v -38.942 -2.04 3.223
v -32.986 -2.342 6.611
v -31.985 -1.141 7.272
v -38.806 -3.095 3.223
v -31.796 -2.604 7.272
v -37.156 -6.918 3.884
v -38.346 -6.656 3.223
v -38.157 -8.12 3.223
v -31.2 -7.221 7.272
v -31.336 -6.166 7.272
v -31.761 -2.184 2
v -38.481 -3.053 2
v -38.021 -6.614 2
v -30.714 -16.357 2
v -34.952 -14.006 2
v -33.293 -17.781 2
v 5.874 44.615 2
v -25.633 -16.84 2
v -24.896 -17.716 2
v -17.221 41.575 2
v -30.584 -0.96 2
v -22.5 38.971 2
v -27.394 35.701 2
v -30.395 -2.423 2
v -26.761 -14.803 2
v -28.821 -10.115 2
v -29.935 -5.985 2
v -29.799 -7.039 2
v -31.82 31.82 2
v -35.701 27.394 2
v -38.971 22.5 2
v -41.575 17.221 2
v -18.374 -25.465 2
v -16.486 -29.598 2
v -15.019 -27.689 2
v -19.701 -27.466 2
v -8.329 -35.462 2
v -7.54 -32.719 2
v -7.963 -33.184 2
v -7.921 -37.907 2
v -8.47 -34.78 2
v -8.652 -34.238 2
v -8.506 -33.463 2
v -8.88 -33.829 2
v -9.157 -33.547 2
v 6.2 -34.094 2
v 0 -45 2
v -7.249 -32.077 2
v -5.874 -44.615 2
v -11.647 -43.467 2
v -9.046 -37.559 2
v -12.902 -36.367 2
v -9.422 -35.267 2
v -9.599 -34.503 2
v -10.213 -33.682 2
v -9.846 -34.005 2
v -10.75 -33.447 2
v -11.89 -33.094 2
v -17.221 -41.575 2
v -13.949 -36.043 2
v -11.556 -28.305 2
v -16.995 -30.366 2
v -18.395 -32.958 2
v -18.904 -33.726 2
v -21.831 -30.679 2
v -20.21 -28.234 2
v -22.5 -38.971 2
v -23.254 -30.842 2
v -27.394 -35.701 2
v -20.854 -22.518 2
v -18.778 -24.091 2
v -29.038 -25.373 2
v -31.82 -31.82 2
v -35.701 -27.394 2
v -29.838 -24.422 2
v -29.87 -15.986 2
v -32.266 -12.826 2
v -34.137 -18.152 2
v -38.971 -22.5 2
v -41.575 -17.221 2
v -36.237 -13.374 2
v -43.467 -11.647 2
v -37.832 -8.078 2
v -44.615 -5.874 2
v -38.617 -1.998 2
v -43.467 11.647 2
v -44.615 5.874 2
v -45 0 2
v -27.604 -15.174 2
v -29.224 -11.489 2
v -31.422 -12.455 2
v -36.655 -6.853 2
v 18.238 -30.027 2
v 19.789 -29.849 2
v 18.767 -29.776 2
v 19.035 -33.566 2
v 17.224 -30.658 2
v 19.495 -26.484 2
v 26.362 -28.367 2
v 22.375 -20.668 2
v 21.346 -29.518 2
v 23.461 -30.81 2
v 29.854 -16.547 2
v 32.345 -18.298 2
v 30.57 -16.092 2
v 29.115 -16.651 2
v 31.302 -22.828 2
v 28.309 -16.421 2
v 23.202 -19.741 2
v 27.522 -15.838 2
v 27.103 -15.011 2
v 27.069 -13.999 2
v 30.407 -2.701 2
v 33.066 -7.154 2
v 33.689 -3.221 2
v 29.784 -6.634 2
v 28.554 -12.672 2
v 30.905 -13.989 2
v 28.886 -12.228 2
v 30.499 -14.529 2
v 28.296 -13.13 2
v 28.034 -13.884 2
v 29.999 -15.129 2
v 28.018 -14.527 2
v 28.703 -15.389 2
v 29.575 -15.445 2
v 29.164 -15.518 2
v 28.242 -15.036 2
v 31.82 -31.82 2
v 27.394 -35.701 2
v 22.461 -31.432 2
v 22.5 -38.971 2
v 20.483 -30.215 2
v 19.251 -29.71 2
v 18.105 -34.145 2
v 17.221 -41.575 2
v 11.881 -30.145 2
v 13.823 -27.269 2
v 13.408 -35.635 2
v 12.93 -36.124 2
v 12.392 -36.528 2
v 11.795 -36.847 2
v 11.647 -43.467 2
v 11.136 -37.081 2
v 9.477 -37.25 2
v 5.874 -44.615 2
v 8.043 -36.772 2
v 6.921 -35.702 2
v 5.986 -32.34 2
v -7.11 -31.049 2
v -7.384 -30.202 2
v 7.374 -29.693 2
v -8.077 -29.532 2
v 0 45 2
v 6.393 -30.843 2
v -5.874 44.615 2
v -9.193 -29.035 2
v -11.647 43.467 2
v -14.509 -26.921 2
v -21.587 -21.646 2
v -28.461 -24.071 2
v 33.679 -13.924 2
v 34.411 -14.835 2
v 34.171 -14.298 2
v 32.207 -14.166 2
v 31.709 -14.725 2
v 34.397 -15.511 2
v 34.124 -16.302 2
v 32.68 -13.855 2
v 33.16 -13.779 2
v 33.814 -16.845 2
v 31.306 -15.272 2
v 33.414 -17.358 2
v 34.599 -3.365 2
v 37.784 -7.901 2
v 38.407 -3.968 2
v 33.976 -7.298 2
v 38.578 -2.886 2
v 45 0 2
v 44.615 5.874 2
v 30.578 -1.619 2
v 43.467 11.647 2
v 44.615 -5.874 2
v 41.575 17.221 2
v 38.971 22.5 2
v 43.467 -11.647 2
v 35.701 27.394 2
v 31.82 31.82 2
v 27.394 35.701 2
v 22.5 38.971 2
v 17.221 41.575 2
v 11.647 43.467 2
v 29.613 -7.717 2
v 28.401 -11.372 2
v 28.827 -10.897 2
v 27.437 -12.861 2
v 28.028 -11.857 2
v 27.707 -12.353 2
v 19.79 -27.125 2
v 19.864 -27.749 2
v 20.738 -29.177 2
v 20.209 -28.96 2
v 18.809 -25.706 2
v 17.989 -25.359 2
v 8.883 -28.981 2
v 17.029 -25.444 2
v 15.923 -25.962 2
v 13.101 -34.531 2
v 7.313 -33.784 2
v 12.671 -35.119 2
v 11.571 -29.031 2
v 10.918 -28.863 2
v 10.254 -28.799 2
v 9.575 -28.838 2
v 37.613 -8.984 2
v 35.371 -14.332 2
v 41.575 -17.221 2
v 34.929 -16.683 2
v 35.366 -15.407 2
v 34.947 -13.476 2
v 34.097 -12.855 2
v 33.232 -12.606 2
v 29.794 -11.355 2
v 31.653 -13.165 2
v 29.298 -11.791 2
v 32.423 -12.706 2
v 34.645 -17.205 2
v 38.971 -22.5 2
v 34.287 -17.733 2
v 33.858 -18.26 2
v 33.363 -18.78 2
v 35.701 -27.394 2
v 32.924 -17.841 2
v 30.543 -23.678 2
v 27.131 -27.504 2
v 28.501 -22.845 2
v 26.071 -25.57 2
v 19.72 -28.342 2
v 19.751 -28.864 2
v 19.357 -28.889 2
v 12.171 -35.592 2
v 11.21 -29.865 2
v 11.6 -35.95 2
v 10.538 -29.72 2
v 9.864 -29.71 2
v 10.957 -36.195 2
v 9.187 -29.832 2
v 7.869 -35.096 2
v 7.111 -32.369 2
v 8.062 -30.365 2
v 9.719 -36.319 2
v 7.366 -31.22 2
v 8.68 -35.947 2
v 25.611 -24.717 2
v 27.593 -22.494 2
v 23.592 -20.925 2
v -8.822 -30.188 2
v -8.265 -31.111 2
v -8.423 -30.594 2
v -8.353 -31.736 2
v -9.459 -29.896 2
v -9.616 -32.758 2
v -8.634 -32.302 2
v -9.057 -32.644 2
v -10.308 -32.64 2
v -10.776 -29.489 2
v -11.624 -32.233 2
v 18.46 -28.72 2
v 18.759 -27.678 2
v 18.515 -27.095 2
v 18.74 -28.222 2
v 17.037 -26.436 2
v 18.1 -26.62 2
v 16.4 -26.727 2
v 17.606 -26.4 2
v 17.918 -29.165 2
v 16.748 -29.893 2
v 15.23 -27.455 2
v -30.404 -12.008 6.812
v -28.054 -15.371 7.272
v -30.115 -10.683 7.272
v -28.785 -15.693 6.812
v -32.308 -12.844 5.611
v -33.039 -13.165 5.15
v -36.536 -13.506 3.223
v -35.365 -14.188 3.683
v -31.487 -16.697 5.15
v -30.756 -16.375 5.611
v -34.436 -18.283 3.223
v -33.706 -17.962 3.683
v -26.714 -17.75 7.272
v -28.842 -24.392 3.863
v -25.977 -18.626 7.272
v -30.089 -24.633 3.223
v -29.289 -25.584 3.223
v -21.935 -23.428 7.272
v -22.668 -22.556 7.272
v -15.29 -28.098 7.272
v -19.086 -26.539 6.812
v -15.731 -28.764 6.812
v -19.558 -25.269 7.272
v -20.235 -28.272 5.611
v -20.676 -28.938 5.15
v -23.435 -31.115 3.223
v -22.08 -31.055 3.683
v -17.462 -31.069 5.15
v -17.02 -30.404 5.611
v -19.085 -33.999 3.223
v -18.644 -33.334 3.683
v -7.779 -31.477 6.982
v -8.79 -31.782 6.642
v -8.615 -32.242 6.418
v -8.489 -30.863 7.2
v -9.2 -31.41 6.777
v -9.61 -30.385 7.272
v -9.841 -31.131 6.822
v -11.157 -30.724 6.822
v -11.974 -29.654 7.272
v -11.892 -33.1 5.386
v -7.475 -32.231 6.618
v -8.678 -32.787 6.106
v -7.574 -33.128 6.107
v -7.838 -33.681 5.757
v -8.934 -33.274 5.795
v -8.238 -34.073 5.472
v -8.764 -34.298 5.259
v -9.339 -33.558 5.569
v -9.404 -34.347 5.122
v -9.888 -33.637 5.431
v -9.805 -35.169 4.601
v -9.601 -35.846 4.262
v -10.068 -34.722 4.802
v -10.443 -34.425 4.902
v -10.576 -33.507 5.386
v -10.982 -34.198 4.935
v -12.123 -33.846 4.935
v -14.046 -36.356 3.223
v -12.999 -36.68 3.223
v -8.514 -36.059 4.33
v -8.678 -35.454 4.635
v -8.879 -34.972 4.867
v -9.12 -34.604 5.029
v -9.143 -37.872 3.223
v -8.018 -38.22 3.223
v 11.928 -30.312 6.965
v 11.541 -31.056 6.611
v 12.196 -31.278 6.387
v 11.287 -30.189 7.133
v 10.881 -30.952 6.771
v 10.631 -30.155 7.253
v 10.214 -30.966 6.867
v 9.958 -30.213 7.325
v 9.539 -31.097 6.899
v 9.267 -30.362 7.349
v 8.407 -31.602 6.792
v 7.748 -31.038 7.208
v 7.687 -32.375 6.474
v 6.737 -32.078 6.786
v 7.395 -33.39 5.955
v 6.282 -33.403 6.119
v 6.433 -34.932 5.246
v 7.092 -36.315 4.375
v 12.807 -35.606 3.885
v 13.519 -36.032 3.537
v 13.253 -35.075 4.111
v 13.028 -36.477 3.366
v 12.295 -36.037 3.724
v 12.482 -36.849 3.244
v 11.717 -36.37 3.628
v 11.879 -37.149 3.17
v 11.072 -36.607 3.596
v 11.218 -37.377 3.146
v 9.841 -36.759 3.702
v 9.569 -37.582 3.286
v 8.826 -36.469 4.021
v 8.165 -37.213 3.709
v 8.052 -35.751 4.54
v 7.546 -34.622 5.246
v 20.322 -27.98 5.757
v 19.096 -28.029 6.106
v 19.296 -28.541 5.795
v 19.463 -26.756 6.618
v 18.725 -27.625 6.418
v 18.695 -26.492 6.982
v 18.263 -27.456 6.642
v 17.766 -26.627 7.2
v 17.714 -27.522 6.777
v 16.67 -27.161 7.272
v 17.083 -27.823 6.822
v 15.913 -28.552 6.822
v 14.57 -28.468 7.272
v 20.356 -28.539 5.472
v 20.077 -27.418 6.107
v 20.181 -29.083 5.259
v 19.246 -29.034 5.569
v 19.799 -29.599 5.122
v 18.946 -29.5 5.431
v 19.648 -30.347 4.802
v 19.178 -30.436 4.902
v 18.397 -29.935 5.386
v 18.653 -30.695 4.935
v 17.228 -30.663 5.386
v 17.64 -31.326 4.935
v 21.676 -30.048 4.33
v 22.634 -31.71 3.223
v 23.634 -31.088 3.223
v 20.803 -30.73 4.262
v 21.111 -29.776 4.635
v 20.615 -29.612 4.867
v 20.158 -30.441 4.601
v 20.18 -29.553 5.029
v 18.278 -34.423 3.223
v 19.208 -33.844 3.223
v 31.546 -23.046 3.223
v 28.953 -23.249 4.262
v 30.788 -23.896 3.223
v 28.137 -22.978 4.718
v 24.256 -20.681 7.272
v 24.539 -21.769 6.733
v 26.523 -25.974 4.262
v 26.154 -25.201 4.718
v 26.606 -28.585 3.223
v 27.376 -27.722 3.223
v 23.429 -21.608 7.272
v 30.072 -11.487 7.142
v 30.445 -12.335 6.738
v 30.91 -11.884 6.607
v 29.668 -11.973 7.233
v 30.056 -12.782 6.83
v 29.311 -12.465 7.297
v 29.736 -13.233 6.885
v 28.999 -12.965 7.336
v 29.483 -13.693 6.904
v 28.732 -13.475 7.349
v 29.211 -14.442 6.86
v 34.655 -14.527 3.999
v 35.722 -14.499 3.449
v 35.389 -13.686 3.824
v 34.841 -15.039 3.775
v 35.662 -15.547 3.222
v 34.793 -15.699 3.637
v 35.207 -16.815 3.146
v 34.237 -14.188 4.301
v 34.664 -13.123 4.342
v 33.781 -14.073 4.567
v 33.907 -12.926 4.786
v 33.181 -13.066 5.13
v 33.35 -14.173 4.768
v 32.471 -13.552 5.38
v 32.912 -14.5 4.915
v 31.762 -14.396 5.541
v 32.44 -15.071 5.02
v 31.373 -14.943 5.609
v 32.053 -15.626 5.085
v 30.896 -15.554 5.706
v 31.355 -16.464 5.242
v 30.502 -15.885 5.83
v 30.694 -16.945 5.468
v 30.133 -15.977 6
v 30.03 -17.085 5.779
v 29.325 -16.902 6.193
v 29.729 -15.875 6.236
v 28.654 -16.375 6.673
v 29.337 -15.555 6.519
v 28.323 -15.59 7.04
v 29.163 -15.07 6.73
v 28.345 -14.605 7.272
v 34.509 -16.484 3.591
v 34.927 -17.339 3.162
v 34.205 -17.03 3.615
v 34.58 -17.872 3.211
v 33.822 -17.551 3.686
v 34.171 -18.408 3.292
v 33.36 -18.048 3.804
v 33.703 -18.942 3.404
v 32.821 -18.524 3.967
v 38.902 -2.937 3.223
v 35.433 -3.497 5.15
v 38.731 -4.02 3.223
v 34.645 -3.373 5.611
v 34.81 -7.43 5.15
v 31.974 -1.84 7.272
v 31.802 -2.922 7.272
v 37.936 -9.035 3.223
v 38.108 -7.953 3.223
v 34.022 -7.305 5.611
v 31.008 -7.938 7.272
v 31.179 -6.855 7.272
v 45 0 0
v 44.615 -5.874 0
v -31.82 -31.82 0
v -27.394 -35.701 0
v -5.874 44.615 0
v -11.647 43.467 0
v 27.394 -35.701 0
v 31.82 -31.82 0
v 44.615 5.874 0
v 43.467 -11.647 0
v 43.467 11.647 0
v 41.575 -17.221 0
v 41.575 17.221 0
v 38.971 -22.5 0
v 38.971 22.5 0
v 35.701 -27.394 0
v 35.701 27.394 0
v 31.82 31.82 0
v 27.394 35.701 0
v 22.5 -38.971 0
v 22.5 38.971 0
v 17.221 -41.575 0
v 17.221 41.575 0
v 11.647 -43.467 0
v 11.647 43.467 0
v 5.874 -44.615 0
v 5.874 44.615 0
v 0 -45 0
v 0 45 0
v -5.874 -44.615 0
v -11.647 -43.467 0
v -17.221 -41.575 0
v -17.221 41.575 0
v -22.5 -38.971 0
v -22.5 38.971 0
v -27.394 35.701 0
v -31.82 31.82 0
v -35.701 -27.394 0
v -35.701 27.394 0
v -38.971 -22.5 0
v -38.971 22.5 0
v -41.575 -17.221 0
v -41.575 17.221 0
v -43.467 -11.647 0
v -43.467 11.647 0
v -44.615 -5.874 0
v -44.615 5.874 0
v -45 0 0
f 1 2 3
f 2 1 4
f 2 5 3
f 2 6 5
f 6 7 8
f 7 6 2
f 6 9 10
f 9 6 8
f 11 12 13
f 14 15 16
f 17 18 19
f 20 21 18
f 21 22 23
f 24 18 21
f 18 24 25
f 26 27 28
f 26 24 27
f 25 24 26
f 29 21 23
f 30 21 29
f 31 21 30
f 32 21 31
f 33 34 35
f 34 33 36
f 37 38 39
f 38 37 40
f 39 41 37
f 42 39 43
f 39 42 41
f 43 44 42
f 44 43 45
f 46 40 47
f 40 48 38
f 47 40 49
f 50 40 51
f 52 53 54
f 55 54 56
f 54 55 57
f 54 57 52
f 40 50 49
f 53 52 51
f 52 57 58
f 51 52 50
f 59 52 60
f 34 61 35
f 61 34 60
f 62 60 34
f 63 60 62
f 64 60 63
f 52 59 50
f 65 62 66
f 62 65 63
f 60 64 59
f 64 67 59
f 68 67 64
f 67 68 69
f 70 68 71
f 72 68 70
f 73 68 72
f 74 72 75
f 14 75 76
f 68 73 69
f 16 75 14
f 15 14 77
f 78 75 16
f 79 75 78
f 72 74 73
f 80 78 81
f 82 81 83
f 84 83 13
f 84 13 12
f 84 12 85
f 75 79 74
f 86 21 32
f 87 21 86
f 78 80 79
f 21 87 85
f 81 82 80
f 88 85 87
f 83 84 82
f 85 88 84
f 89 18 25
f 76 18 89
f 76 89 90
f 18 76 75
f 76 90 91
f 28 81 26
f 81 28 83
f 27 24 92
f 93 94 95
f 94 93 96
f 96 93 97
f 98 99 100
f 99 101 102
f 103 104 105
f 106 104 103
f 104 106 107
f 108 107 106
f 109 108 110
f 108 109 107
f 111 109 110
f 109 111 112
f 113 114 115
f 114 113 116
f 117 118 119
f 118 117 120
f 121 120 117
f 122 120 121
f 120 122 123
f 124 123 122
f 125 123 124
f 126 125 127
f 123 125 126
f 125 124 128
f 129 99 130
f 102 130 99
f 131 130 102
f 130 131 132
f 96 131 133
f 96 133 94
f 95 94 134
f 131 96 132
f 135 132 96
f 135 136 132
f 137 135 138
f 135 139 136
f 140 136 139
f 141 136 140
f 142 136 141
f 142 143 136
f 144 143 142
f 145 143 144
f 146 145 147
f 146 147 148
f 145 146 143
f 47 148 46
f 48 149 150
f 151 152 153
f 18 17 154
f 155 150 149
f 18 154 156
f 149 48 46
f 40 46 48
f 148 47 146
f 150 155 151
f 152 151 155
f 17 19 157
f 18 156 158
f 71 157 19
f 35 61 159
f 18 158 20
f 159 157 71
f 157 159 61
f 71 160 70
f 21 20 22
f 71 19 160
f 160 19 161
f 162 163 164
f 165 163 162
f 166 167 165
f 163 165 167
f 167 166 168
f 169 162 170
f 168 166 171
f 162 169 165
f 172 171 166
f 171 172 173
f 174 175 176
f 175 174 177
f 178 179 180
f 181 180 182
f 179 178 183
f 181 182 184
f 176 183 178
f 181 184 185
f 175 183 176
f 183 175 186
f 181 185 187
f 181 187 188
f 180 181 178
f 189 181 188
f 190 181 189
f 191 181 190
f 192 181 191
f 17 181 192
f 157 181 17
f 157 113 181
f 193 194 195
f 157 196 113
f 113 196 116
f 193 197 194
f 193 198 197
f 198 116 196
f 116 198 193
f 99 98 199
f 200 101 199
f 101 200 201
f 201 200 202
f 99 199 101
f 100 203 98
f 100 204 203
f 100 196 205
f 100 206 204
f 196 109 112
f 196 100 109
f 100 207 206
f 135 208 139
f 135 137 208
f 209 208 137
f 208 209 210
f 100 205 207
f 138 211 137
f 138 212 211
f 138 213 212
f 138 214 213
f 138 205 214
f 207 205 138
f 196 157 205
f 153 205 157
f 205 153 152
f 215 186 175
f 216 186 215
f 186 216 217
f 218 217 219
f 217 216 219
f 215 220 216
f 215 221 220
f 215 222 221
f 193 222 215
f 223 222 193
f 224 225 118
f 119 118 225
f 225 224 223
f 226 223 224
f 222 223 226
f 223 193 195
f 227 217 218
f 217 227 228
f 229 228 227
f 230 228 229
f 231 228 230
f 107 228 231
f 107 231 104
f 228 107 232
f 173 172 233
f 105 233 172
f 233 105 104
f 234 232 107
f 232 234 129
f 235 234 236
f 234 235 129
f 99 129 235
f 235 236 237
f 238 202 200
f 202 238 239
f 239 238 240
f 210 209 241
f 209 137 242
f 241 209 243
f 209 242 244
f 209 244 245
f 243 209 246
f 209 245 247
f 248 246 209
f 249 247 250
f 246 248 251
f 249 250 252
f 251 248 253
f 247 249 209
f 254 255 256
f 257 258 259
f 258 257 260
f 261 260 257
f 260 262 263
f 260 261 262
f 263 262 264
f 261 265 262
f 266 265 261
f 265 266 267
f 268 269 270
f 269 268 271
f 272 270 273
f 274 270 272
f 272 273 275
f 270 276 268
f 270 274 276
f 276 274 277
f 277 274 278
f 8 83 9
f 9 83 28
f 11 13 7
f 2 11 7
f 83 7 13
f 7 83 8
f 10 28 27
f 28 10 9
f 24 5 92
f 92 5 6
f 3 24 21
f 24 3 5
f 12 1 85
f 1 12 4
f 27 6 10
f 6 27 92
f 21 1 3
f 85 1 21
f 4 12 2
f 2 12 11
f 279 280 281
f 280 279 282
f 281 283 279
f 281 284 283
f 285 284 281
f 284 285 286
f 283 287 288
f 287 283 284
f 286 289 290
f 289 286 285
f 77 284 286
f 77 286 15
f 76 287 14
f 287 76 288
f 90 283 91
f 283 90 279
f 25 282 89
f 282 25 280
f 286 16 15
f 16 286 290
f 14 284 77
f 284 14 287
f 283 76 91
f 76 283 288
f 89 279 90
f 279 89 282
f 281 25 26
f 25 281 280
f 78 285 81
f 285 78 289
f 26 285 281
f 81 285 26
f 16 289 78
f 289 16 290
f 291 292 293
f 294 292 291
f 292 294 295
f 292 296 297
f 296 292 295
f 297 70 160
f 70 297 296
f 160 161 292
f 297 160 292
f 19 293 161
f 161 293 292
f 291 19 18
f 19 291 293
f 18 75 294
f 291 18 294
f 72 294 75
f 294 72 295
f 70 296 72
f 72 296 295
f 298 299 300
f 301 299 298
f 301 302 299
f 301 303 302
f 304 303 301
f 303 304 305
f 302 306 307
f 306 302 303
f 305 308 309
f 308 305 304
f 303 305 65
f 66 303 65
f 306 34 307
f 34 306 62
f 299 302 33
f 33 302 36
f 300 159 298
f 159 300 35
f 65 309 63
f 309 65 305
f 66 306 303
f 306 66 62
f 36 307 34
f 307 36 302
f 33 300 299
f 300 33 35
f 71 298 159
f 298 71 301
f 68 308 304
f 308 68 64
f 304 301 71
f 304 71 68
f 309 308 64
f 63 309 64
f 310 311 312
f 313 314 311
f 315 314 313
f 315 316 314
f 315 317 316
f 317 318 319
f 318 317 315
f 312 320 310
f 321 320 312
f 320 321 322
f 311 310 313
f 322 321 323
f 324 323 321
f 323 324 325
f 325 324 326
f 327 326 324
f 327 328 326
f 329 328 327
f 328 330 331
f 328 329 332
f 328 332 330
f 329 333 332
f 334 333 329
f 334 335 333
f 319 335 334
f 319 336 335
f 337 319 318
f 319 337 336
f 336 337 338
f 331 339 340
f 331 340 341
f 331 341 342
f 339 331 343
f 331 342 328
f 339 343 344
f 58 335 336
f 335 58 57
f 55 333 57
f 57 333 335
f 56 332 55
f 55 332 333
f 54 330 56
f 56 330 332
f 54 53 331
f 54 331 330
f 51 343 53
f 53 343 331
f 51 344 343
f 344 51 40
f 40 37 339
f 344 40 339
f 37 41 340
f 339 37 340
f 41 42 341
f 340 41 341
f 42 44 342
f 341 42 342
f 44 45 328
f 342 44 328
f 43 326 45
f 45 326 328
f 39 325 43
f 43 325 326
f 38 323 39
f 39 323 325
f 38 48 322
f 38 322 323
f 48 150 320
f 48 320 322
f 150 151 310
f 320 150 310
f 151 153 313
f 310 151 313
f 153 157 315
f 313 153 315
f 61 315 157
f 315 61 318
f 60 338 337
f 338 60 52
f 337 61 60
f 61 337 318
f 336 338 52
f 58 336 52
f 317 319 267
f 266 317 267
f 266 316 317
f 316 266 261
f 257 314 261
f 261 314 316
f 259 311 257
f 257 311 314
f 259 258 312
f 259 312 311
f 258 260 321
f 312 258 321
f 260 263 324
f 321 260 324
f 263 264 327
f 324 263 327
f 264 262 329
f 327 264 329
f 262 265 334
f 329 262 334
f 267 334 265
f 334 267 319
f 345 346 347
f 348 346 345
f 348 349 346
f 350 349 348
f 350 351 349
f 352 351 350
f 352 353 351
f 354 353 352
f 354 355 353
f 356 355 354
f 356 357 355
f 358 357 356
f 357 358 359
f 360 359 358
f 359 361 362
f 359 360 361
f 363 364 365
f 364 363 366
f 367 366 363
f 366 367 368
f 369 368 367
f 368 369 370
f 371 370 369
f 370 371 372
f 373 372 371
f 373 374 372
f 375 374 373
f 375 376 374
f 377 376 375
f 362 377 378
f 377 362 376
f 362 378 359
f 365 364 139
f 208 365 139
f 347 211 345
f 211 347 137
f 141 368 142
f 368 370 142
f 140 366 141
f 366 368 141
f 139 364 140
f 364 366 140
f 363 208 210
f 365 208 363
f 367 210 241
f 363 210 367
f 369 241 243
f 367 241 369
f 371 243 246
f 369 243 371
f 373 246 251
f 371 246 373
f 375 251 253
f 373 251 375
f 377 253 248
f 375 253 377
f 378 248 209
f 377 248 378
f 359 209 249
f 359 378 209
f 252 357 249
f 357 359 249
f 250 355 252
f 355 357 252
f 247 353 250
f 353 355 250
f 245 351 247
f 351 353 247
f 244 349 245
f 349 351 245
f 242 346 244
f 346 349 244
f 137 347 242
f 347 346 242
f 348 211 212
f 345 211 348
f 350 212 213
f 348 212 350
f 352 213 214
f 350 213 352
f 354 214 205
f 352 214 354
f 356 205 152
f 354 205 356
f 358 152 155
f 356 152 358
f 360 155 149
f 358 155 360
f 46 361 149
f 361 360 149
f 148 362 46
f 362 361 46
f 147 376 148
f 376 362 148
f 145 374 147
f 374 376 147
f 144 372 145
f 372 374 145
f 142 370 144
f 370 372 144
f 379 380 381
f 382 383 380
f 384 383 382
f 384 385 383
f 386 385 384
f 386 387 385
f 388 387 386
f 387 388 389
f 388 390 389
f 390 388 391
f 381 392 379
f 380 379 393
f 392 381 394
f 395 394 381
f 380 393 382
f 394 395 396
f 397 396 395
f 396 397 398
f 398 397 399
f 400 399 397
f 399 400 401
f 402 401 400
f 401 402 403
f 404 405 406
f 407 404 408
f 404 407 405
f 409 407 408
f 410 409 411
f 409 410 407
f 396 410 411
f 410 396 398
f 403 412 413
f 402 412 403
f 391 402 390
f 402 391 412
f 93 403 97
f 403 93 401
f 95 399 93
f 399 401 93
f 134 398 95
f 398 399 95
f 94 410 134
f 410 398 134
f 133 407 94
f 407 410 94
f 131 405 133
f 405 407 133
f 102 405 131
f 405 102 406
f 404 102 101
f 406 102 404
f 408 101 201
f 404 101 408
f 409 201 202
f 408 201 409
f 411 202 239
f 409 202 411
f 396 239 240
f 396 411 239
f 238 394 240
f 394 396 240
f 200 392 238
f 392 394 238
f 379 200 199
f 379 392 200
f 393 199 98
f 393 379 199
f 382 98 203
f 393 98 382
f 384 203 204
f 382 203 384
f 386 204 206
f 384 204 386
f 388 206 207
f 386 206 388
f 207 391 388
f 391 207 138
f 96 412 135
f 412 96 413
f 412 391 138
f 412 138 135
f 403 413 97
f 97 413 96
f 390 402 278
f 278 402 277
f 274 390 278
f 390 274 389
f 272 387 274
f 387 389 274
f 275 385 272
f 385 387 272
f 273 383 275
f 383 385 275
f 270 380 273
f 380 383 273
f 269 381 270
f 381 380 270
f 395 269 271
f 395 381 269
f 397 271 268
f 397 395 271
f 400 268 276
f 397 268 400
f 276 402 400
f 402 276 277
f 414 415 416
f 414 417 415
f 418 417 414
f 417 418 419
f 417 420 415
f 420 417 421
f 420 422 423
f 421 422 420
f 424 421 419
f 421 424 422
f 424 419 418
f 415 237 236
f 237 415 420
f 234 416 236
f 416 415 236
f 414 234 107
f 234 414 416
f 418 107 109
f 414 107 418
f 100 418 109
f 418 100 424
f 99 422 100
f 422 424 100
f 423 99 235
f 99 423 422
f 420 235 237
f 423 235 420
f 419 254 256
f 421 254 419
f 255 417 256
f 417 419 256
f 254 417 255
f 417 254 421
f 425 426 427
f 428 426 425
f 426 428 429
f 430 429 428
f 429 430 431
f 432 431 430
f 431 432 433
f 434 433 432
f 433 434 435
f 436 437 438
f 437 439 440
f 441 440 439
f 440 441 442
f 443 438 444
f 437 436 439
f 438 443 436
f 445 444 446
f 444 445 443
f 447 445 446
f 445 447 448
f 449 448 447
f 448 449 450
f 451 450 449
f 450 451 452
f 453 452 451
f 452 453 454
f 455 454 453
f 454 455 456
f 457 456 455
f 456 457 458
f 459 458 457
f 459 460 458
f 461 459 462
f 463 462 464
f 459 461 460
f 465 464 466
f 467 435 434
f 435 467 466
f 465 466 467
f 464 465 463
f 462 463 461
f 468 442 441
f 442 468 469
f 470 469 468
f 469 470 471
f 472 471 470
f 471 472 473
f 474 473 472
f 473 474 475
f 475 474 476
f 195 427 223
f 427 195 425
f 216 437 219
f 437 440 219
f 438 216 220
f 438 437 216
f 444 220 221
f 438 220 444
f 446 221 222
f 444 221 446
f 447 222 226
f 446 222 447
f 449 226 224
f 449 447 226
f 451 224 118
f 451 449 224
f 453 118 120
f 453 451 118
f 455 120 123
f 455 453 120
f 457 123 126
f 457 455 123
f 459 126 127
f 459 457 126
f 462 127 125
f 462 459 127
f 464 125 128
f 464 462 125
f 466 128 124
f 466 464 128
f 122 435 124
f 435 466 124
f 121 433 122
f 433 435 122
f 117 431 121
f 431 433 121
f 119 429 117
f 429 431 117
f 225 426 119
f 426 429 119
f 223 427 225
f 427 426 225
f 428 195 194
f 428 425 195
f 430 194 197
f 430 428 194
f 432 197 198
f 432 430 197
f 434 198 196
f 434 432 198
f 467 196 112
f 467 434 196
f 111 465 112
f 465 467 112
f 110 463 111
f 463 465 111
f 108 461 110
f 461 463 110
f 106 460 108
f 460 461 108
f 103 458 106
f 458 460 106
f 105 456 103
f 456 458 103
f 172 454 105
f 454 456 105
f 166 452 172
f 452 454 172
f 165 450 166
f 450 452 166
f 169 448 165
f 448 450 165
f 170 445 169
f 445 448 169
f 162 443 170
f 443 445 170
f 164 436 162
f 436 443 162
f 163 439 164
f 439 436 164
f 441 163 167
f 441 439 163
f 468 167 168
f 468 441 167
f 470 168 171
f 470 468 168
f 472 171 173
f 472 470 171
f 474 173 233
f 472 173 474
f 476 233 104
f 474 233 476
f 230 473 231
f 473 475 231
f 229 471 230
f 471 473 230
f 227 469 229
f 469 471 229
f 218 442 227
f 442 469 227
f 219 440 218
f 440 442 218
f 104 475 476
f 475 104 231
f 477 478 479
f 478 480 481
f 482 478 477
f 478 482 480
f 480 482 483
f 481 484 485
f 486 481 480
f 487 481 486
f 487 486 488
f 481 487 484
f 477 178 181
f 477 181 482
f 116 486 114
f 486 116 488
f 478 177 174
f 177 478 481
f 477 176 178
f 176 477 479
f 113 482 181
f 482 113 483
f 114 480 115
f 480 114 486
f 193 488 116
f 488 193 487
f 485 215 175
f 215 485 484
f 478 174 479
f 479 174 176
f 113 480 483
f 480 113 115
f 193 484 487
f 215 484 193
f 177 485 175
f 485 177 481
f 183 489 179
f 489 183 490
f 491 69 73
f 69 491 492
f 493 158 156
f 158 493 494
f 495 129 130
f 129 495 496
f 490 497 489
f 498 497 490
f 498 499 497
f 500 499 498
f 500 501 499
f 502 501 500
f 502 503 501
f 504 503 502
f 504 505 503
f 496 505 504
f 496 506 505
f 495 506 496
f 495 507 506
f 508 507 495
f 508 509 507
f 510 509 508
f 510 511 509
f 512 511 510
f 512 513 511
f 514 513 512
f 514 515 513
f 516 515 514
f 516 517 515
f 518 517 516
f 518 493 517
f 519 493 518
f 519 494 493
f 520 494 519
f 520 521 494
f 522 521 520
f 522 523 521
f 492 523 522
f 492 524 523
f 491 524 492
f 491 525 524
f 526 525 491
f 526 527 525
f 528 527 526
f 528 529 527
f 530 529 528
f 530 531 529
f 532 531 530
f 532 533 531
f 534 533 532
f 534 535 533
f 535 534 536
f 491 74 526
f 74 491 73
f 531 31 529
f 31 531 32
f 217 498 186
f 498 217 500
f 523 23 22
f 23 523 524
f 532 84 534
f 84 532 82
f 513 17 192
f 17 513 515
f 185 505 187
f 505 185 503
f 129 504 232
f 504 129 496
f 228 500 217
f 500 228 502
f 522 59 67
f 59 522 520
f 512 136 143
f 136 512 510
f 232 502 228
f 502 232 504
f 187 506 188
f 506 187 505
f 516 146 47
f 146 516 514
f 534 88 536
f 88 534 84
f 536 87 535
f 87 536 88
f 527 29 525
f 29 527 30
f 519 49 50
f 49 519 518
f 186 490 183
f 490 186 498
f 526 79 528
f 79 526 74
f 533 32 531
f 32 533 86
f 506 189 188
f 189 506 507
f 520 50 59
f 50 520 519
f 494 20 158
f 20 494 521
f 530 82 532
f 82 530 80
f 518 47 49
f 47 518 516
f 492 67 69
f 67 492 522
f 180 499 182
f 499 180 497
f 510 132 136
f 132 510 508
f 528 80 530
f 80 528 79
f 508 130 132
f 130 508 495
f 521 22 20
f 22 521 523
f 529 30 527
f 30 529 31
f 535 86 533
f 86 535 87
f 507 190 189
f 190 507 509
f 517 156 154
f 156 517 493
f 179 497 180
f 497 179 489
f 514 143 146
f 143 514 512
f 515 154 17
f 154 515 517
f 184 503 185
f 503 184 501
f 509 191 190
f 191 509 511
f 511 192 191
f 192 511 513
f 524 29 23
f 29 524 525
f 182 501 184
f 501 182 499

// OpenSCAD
radius = 45; // [45:450]
bottom_thickness = 2;

text = "NEVER CRASH";
font_name = "Arial Black";
font_size = 8;

/**
* pie.scad
*
* Creates a pie (circular sector). You can pass a 2 element vector to define the central angle. Its $fa, $fs and $fn parameters are consistent with the circle module.
* 
* @copyright Justin Lin, 2017
* @license https://opensource.org/licenses/lgpl-3.0.html
*
* @see https://openhome.cc/eGossip/OpenSCAD/lib-pie.html
*
**/

function __frags(radius) = $fn > 0 ? 
            ($fn >= 3 ? $fn : 3) : 
            max(min(360 / $fa, radius * 6.28318 / $fs), 5);
                
function __is_vector(value) = !(value >= "") && len(value) != undef;

function __ra_to_xy(r, a) = [r * cos(a), r * sin(a)];

function __shape_pie(radius, angle) =
    let(
        frags = __frags(radius),
        a_step = 360 / frags,
        leng = radius * cos(a_step / 2),
        angles = __is_vector(angle) ? angle : [0:angle],
        m = floor(angles[0] / a_step) + 1,
        n = floor(angles[1] / a_step),
        edge_r_begin = leng / cos((m - 0.5) * a_step - angles[0]),
        edge_r_end = leng / cos((n + 0.5) * a_step - angles[1]),
        shape_pts = concat(
            [[0, 0], __ra_to_xy(edge_r_begin, angles[0])],
            m > n ? [] : [
                for(i = [m:n]) 
                    let(a = a_step * i) 
                    __ra_to_xy(radius, a)
            ],
            angles[1] == a_step * n ? [] : [__ra_to_xy(edge_r_end, angles[1])]
        )
    ) shape_pts;
 
module pie(radius, angle) {
    polygon(__shape_pie(radius, angle));
}

module char(c, font_name, font_size) {
    rotate(90) 
        rotate([-90, 0, 0]) 
            intersection() {
                linear_extrude(font_size * 2, center = true) 
                    pie(radius = font_size * 2, angle = [-30, 0]);  
                    
                rotate_extrude() 
                    translate([font_size / 1.25, 0, 0]) rotate(-90) 
                        text(c, font = font_name, size = font_size, valign = "center", halign = "center"); 
            }
}

module Buddha_Duke() {
    t_len = len(text);
    a_step = 180 / t_len;
    
    for(i = [0:t_len - 1]) {
        translate([0, 0, bottom_thickness]) 
            rotate(-90 + a_step * i + 0.45 * a_step)
                translate([0, -radius + font_size / 2, 0]) 
                    char(text[i], font_name, font_size, $fn = 12);
    }

    linear_extrude(bottom_thickness) 
        circle(radius, $fn = 48); 
}

Buddha_Duke(text, font_name, font_size, radius, bottom_thickness);
